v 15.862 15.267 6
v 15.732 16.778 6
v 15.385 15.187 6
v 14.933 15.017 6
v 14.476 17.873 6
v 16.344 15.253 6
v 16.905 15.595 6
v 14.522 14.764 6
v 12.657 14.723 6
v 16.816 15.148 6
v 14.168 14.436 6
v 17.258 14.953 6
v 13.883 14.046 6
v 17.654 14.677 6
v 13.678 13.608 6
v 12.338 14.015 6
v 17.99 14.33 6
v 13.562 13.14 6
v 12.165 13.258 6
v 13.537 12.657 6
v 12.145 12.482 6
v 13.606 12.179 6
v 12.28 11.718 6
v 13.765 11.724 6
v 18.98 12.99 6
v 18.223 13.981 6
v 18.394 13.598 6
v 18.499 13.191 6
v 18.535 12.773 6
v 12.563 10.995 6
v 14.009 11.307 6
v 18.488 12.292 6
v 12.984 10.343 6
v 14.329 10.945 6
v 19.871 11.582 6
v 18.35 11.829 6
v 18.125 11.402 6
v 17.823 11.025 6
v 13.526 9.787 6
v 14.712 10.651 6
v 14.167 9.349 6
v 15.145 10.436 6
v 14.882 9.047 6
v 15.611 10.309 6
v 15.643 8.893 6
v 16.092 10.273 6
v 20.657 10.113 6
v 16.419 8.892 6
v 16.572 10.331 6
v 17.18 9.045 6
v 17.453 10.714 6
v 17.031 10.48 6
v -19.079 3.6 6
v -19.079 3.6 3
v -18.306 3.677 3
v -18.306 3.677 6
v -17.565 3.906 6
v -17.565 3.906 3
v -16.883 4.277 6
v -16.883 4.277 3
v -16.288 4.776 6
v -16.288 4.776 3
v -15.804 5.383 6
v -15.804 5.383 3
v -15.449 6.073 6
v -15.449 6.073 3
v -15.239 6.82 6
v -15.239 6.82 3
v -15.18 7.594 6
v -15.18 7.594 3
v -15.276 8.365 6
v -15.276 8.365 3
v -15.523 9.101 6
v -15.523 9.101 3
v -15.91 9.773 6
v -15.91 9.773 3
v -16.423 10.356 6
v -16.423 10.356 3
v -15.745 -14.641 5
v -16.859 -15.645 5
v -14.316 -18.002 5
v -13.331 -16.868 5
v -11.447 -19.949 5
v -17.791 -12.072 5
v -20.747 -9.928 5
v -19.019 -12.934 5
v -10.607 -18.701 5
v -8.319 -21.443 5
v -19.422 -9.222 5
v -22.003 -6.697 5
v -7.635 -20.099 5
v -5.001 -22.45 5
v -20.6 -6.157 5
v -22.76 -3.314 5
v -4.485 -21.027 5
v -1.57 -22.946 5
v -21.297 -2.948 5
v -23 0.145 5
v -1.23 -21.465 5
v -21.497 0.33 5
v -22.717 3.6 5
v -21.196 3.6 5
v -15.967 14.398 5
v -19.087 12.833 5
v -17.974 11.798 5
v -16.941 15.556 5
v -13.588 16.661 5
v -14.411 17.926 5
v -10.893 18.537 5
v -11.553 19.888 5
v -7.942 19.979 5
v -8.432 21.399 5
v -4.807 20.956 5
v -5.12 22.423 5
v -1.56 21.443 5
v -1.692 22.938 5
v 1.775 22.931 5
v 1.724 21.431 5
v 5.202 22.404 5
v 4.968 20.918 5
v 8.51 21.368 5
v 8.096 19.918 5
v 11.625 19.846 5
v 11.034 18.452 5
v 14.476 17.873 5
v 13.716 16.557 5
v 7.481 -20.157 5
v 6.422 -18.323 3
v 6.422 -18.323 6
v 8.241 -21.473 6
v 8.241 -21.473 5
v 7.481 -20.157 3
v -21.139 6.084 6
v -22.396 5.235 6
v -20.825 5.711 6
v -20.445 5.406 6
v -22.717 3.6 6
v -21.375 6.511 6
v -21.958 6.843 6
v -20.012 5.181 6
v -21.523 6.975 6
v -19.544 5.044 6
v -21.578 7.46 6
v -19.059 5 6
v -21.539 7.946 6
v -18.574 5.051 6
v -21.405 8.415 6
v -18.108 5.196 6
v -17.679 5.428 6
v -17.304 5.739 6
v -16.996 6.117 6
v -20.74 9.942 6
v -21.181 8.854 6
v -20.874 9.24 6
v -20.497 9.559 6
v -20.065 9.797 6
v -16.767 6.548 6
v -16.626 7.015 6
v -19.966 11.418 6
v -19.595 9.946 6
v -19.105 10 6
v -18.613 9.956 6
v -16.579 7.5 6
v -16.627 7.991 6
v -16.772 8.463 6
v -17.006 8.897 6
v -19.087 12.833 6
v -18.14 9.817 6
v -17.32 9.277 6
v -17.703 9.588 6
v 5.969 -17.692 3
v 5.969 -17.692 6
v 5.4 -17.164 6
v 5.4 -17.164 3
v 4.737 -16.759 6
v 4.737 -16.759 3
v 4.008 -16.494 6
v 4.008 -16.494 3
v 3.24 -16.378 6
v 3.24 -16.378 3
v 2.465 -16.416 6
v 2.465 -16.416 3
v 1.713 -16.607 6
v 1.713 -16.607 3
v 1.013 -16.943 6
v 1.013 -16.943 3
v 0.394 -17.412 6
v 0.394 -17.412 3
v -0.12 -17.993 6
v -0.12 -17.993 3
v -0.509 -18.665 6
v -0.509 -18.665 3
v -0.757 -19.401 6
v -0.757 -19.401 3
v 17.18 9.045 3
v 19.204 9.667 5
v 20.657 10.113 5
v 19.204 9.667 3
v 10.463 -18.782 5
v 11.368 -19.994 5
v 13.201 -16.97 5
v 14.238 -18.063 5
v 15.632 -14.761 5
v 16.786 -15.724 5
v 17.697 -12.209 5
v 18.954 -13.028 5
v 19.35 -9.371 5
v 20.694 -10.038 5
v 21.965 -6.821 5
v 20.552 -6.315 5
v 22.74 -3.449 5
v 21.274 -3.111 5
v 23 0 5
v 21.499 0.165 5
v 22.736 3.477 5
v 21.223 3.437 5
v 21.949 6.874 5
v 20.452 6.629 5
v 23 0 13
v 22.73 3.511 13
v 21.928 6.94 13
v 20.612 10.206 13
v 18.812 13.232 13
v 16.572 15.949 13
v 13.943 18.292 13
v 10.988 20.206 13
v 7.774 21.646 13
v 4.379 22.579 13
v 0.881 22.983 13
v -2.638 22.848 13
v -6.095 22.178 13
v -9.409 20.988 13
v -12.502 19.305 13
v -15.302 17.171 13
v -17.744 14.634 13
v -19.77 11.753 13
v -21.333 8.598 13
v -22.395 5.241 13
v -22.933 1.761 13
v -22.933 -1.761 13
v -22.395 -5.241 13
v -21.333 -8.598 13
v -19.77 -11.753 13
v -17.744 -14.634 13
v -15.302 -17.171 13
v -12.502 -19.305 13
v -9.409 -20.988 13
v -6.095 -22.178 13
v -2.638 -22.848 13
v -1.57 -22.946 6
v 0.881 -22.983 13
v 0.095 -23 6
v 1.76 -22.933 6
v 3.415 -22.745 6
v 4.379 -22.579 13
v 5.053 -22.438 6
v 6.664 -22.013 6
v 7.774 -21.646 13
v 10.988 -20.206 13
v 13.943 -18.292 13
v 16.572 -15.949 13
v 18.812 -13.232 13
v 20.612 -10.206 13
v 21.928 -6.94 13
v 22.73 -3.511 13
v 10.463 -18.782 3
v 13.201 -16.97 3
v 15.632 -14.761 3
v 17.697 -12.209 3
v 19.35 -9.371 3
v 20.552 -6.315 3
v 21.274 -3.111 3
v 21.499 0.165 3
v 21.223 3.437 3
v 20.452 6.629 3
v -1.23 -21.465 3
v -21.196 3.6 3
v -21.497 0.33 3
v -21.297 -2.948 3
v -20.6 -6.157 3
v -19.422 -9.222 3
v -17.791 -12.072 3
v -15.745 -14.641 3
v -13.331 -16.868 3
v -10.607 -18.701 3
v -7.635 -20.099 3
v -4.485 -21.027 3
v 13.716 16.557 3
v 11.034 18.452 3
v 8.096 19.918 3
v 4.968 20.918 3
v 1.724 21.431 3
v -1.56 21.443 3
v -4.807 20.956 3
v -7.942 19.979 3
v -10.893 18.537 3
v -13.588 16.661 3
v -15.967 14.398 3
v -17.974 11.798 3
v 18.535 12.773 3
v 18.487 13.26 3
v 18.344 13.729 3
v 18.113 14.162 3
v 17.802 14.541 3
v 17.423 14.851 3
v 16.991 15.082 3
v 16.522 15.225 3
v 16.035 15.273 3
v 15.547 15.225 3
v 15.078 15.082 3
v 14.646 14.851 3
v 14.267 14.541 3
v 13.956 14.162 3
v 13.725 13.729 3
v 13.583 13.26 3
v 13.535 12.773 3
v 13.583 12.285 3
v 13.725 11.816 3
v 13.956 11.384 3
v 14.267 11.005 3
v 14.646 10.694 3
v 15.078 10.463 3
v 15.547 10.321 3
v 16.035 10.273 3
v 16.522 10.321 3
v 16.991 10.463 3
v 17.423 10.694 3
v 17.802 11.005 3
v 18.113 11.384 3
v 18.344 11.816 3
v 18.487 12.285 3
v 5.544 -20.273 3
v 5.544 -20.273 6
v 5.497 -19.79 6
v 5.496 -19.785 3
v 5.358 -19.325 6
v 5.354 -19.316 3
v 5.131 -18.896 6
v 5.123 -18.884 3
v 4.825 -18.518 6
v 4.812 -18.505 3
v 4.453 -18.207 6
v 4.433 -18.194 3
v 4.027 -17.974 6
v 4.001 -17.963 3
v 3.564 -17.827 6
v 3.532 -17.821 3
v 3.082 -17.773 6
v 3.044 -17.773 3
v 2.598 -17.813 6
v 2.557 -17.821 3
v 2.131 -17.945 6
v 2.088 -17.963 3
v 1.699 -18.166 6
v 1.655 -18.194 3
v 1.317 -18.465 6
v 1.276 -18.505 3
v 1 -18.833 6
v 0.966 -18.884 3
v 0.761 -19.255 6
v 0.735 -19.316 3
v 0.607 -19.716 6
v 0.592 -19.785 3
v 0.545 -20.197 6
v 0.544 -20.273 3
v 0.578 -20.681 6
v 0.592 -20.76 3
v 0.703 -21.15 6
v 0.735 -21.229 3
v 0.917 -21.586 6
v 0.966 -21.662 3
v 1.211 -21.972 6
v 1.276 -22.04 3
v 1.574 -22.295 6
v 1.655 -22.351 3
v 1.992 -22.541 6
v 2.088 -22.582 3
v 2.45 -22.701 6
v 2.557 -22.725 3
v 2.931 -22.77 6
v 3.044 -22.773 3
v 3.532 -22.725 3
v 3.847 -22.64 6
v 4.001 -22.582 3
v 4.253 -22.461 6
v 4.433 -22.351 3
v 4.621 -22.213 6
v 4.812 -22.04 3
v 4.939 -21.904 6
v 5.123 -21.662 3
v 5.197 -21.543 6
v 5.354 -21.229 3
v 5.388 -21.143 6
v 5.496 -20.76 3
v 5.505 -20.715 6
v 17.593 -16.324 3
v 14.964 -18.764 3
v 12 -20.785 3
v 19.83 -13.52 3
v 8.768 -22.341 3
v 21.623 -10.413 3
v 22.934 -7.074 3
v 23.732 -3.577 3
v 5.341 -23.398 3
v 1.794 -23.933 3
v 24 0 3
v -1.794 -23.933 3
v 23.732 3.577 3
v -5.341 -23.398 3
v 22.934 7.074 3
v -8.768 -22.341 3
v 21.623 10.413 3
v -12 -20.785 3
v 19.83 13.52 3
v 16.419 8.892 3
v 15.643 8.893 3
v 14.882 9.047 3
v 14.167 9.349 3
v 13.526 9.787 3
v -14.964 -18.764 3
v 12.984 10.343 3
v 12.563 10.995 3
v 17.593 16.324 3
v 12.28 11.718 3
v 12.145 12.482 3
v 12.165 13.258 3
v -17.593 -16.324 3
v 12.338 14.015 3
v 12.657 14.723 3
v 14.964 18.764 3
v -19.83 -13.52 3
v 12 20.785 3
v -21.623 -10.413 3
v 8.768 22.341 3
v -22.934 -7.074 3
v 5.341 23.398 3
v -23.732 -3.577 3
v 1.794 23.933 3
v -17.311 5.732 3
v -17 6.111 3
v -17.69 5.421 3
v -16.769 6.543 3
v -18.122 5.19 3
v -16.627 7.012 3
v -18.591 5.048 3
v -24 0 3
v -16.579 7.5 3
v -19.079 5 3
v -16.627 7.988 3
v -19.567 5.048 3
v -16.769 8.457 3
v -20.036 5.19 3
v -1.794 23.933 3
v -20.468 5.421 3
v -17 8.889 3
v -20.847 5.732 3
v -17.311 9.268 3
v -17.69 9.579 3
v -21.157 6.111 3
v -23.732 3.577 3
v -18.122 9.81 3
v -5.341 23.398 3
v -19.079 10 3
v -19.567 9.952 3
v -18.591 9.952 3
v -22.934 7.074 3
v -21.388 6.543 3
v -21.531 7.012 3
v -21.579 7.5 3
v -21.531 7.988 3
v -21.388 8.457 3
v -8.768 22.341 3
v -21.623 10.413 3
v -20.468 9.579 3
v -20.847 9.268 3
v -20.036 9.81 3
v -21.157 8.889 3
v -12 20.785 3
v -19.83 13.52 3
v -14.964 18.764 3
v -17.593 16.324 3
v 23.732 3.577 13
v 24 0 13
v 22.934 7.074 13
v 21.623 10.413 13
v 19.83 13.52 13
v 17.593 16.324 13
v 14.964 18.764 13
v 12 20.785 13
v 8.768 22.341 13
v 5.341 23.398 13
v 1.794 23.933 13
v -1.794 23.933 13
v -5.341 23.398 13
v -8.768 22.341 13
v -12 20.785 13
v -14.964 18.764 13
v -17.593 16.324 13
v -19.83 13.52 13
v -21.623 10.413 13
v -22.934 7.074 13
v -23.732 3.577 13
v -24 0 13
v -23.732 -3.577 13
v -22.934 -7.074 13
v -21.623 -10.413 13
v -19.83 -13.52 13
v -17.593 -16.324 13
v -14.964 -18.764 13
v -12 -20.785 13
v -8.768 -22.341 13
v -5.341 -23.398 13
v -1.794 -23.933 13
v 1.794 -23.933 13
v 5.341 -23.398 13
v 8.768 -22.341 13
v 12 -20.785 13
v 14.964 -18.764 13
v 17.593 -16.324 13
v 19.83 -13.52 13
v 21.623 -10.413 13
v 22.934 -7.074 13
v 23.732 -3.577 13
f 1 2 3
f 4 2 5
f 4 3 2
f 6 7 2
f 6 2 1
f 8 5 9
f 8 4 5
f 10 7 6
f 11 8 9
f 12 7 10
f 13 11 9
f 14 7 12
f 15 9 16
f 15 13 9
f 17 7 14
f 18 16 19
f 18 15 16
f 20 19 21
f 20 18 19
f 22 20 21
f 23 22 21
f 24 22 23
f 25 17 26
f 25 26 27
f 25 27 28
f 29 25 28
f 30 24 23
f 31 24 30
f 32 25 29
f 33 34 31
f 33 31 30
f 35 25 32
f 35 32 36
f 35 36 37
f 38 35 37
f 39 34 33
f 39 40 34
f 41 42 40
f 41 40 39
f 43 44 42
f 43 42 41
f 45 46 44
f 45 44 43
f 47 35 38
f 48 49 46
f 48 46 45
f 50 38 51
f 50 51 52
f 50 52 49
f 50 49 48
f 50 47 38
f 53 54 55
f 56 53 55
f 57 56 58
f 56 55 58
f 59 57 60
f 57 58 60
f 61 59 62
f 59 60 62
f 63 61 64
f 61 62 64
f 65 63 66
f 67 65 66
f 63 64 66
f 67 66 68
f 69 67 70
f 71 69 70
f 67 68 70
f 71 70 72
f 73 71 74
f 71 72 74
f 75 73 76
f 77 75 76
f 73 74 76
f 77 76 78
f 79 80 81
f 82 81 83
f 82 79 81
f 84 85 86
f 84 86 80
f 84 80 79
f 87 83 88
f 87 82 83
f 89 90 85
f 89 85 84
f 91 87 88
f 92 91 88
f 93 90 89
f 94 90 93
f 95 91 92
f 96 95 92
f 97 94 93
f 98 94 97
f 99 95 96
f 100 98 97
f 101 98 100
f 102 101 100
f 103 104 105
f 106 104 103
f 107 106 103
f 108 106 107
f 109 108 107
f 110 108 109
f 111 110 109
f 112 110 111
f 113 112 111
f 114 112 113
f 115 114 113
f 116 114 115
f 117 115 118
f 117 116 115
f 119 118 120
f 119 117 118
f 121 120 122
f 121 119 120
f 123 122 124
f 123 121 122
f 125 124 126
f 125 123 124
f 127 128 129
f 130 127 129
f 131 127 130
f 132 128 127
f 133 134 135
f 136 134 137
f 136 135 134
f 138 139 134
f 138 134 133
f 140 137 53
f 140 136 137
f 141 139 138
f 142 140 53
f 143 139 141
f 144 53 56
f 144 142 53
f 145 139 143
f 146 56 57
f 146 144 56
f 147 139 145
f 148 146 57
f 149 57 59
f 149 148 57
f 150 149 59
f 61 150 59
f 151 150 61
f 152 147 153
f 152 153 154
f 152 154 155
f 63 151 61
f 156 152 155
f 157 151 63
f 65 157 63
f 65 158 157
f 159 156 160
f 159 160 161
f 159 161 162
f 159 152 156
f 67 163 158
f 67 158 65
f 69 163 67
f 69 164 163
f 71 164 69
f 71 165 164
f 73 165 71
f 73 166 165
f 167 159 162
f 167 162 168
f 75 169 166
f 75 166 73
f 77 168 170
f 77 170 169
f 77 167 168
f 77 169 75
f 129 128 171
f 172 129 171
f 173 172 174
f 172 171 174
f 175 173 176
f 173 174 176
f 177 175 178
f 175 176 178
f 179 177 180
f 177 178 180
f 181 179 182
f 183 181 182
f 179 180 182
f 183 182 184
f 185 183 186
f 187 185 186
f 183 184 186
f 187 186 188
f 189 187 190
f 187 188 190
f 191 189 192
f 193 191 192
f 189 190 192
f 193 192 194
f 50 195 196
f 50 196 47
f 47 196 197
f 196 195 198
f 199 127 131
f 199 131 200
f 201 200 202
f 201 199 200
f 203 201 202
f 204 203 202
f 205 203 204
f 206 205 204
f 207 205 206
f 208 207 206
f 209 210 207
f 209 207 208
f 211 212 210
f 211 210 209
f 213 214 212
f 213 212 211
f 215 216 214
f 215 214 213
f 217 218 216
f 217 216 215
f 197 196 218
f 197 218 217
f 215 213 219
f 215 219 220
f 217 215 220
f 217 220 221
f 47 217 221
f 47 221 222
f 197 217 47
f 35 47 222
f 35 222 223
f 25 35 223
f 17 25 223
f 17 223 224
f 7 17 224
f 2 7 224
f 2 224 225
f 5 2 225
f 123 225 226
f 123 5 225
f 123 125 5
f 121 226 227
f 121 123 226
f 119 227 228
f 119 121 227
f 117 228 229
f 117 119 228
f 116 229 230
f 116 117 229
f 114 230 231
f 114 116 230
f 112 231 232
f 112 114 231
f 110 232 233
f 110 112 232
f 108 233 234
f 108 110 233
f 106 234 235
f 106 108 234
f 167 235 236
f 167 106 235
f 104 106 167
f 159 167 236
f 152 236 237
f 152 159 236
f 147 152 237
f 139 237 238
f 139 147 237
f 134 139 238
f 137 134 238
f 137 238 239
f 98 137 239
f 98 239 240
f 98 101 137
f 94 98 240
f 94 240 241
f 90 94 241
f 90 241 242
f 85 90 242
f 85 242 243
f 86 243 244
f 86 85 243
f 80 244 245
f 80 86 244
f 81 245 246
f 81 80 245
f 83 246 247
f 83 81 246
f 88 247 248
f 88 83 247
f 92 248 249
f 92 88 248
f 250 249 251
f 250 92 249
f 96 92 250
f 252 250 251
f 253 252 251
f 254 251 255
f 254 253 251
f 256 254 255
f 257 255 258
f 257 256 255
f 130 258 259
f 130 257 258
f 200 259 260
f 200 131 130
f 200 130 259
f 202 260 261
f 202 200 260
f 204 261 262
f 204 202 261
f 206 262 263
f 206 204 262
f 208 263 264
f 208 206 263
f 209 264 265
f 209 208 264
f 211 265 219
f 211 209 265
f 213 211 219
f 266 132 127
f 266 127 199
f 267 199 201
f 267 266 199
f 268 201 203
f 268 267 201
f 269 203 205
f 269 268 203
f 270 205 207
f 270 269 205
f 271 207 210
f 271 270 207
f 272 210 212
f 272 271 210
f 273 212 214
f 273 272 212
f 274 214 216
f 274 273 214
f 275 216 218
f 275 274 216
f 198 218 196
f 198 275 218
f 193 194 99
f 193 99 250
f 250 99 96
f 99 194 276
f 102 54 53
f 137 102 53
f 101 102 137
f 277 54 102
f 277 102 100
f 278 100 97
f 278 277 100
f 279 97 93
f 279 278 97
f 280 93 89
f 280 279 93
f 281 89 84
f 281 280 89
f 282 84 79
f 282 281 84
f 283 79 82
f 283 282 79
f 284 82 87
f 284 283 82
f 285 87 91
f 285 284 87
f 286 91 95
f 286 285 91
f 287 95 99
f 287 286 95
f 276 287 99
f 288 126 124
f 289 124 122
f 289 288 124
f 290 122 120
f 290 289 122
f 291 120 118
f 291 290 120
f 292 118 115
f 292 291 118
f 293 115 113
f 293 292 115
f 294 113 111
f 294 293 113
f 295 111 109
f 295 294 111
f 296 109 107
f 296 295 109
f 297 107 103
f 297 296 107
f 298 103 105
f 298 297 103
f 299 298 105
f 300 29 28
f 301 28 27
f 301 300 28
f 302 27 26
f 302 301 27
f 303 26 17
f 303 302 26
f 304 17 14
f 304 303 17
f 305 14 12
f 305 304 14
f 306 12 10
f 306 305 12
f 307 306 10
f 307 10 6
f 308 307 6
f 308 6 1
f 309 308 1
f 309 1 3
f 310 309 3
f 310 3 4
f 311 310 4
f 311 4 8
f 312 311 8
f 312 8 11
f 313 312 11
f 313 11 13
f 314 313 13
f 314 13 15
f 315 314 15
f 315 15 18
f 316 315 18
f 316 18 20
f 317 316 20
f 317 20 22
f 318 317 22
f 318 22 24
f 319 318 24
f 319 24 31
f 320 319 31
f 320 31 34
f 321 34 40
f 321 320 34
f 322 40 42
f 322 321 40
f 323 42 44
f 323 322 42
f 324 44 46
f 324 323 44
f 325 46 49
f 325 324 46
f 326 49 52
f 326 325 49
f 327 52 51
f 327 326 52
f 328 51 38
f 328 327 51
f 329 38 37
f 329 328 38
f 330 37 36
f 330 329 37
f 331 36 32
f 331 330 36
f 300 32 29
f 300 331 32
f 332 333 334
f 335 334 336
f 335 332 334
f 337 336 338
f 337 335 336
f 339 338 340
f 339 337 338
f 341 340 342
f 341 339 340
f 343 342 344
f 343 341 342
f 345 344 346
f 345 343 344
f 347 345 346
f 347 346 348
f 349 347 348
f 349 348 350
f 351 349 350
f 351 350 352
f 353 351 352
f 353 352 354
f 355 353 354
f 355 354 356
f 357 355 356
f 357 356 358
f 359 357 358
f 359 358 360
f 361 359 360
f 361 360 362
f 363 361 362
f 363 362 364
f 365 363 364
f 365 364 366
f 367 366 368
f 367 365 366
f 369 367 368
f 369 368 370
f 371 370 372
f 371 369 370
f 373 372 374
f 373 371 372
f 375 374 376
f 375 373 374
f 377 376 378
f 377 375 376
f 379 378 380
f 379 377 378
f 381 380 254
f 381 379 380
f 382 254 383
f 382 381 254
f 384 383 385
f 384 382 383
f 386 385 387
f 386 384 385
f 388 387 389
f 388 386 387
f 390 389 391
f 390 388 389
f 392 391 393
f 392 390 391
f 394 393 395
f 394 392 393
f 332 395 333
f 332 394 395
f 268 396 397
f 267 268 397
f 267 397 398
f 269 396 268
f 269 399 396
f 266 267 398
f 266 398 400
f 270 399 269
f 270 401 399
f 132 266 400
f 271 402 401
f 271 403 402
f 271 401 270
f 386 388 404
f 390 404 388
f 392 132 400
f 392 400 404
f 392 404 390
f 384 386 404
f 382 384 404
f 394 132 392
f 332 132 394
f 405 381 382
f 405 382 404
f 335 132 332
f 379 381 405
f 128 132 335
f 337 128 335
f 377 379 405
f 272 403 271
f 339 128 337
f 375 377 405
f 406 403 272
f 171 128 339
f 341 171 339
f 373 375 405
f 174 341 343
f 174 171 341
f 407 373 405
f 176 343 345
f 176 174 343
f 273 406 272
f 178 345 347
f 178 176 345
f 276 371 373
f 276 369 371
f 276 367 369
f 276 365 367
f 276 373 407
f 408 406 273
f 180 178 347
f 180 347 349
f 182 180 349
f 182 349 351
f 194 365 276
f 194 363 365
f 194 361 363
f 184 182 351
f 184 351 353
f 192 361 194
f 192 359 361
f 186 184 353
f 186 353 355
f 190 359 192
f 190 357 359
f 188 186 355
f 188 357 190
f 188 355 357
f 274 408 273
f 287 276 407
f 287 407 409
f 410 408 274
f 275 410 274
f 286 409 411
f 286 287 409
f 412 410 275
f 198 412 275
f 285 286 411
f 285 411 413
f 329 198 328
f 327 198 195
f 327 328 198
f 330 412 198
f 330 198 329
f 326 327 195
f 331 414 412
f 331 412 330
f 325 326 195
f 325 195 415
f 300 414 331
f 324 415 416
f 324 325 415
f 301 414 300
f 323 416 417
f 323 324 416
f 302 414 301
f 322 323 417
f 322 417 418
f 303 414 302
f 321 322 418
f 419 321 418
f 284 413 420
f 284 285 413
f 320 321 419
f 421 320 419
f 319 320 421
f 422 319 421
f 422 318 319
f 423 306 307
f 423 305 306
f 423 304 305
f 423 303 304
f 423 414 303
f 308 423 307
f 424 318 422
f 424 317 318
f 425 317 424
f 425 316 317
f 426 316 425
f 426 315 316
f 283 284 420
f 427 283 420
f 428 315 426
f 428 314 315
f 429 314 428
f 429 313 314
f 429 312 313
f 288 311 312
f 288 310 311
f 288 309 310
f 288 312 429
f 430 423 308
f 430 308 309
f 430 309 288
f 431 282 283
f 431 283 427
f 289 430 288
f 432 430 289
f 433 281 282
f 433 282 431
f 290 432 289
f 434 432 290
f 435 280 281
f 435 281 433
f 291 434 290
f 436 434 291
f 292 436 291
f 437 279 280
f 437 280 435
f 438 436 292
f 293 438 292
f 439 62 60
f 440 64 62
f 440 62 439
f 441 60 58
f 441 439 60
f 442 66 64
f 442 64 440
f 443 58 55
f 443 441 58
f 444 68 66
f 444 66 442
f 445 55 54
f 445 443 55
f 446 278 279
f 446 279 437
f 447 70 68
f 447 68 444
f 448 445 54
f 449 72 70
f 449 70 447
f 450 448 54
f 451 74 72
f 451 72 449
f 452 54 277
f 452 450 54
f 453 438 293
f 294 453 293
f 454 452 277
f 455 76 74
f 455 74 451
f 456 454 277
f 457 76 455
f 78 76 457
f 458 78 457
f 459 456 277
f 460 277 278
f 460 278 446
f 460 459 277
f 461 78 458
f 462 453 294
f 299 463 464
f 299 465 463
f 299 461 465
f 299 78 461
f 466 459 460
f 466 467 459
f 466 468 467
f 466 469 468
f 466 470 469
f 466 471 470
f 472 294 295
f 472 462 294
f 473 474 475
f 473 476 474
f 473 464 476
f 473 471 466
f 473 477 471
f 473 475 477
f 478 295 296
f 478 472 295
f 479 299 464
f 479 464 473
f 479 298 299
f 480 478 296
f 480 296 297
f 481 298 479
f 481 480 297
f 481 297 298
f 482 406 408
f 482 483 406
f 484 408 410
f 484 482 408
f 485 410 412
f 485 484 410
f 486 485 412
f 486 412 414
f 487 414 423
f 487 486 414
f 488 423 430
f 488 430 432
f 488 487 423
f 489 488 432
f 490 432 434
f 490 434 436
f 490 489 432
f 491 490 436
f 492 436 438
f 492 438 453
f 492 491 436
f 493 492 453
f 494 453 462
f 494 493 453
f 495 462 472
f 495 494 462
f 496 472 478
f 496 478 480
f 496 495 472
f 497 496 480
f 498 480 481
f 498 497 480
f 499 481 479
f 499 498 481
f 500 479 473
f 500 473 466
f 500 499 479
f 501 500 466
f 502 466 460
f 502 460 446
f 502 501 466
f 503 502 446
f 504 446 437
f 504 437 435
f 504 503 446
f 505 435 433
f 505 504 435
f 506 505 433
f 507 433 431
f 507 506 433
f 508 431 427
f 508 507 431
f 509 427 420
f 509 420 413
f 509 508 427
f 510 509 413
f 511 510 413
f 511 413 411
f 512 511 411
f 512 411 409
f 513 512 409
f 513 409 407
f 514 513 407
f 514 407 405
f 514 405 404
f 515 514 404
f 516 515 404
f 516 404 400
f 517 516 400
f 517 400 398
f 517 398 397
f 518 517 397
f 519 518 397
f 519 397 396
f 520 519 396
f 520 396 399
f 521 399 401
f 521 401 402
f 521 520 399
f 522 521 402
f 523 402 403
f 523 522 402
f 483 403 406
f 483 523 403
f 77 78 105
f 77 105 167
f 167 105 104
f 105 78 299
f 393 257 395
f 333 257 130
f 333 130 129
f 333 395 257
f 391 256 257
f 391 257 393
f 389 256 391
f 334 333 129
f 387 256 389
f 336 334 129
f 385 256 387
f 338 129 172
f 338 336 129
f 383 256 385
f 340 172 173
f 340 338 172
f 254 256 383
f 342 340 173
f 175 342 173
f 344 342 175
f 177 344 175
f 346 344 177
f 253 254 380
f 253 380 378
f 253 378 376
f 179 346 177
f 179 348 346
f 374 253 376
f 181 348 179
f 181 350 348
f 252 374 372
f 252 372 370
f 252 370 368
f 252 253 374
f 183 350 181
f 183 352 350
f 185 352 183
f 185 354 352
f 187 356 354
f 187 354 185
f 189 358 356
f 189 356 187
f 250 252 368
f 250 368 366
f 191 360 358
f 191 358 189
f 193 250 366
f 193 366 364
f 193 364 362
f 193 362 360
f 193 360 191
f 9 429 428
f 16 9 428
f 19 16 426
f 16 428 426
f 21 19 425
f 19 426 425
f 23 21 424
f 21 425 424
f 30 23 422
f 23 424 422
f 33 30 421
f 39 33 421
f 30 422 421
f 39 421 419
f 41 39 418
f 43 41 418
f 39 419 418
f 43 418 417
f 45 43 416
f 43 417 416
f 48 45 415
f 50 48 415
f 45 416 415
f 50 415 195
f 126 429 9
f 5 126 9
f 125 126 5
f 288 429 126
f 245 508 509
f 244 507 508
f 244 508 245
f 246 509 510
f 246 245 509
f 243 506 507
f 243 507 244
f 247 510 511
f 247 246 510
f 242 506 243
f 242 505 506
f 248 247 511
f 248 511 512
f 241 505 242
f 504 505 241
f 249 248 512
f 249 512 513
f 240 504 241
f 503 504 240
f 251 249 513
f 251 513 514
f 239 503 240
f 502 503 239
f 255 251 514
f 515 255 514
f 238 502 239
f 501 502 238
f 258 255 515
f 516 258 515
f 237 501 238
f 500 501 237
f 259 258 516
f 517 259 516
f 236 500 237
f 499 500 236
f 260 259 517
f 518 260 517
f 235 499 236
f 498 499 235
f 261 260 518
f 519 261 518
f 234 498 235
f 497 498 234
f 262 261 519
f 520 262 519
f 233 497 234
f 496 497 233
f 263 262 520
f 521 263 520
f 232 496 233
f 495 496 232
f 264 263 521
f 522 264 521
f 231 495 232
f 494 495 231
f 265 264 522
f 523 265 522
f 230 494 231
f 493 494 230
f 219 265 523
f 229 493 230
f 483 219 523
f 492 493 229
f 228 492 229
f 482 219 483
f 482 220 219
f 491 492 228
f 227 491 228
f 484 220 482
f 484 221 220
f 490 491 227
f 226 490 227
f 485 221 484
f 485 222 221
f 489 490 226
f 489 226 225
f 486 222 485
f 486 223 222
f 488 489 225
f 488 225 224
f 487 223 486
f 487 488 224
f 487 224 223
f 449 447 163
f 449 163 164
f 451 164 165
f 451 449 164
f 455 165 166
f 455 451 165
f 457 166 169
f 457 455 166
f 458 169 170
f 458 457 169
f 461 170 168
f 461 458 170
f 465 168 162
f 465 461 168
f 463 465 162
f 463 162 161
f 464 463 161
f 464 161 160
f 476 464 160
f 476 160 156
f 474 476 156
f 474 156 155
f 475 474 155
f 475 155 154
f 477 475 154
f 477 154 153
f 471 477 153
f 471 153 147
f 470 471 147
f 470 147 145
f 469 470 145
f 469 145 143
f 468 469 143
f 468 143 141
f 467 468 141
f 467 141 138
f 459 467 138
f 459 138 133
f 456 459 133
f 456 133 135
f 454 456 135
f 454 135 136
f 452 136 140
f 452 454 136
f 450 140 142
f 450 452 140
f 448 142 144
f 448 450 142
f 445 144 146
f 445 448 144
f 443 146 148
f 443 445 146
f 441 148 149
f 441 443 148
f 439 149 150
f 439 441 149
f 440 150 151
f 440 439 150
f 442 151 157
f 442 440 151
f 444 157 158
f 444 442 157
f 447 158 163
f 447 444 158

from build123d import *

# Parameters (mm, degrees)
SKETCH001_R        = 2.625
POCKET_DEPTH       = 5.5
PAD_DEPTH          = 3
POLARPATTERN_COUNT = 3
SKETCH002_R        = 2.5
POCKET001_DEPTH    = 13.001


with BuildPart() as part:
    # Sketch → Revolution (revolve)
    with BuildSketch(Plane.XZ):
        Polygon((21.5, 5), (21.5, 3), (24, 3), (24, 13), (23, 13), (23, 5), align=None)
    revolve(axis=Axis((0, 0, 0), (0, 0, 1)))

    # Sketch001 → Pocket (cut)
    with BuildSketch(Plane.XY):
        with Locations((-17.5, 0)):
            Circle(SKETCH001_R)
        with Locations((-8.75, 15.1554445662)):
            Circle(SKETCH001_R)
        with Locations((8.75, 15.1554445662)):
            Circle(SKETCH001_R)
        with Locations((17.5, 0)):
            Circle(SKETCH001_R)
        with Locations((8.75, -15.1554445662)):
            Circle(SKETCH001_R)
        with Locations((-8.75, -15.1554445662)):
            Circle(SKETCH001_R)
    extrude(amount=POCKET_DEPTH, mode=Mode.SUBTRACT)

    # Sketch003 → Pad (join)
    with BuildSketch(Plane.XY.offset(3)):
        with BuildLine():
            ThreePointArc((-19.0869375712, 12.8331139694), (-21.405483769, 8.4145864197), (-22.716513817, 3.6))
            Line((-19.0788007507, 3.6), (-22.716513817, 3.6))
            ThreePointArc((-19.0788007507, 3.6), (-15.4492148319, 6.0731518485), (-16.4230212393, 10.3559167367))
            Line((-16.4230212393, 10.3559167367), (-19.0869375712, 12.8331139694))
        make_face()
    pad = extrude(amount=PAD_DEPTH)

    # PolarPattern: Pad ×3 about axis
    polarpattern_axis = Axis((0, 0, 3), (0, 0, 1))
    for i in range(1, POLARPATTERN_COUNT):
        add(pad.rotate(polarpattern_axis, i * 360 / POLARPATTERN_COUNT))

    # Sketch002 → Pocket001 (cut, through all)
    with BuildSketch(Plane.XY):
        with Locations((16.0345540639, 12.7727473933)):
            Circle(SKETCH002_R)
        with Locations((3.0442466868, -20.2727048543)):
            Circle(SKETCH002_R)
        with Locations((-19.0788007507, 7.499957461)):
            Circle(SKETCH002_R)
    extrude(amount=POCKET001_DEPTH, mode=Mode.SUBTRACT)


solid = part.part
